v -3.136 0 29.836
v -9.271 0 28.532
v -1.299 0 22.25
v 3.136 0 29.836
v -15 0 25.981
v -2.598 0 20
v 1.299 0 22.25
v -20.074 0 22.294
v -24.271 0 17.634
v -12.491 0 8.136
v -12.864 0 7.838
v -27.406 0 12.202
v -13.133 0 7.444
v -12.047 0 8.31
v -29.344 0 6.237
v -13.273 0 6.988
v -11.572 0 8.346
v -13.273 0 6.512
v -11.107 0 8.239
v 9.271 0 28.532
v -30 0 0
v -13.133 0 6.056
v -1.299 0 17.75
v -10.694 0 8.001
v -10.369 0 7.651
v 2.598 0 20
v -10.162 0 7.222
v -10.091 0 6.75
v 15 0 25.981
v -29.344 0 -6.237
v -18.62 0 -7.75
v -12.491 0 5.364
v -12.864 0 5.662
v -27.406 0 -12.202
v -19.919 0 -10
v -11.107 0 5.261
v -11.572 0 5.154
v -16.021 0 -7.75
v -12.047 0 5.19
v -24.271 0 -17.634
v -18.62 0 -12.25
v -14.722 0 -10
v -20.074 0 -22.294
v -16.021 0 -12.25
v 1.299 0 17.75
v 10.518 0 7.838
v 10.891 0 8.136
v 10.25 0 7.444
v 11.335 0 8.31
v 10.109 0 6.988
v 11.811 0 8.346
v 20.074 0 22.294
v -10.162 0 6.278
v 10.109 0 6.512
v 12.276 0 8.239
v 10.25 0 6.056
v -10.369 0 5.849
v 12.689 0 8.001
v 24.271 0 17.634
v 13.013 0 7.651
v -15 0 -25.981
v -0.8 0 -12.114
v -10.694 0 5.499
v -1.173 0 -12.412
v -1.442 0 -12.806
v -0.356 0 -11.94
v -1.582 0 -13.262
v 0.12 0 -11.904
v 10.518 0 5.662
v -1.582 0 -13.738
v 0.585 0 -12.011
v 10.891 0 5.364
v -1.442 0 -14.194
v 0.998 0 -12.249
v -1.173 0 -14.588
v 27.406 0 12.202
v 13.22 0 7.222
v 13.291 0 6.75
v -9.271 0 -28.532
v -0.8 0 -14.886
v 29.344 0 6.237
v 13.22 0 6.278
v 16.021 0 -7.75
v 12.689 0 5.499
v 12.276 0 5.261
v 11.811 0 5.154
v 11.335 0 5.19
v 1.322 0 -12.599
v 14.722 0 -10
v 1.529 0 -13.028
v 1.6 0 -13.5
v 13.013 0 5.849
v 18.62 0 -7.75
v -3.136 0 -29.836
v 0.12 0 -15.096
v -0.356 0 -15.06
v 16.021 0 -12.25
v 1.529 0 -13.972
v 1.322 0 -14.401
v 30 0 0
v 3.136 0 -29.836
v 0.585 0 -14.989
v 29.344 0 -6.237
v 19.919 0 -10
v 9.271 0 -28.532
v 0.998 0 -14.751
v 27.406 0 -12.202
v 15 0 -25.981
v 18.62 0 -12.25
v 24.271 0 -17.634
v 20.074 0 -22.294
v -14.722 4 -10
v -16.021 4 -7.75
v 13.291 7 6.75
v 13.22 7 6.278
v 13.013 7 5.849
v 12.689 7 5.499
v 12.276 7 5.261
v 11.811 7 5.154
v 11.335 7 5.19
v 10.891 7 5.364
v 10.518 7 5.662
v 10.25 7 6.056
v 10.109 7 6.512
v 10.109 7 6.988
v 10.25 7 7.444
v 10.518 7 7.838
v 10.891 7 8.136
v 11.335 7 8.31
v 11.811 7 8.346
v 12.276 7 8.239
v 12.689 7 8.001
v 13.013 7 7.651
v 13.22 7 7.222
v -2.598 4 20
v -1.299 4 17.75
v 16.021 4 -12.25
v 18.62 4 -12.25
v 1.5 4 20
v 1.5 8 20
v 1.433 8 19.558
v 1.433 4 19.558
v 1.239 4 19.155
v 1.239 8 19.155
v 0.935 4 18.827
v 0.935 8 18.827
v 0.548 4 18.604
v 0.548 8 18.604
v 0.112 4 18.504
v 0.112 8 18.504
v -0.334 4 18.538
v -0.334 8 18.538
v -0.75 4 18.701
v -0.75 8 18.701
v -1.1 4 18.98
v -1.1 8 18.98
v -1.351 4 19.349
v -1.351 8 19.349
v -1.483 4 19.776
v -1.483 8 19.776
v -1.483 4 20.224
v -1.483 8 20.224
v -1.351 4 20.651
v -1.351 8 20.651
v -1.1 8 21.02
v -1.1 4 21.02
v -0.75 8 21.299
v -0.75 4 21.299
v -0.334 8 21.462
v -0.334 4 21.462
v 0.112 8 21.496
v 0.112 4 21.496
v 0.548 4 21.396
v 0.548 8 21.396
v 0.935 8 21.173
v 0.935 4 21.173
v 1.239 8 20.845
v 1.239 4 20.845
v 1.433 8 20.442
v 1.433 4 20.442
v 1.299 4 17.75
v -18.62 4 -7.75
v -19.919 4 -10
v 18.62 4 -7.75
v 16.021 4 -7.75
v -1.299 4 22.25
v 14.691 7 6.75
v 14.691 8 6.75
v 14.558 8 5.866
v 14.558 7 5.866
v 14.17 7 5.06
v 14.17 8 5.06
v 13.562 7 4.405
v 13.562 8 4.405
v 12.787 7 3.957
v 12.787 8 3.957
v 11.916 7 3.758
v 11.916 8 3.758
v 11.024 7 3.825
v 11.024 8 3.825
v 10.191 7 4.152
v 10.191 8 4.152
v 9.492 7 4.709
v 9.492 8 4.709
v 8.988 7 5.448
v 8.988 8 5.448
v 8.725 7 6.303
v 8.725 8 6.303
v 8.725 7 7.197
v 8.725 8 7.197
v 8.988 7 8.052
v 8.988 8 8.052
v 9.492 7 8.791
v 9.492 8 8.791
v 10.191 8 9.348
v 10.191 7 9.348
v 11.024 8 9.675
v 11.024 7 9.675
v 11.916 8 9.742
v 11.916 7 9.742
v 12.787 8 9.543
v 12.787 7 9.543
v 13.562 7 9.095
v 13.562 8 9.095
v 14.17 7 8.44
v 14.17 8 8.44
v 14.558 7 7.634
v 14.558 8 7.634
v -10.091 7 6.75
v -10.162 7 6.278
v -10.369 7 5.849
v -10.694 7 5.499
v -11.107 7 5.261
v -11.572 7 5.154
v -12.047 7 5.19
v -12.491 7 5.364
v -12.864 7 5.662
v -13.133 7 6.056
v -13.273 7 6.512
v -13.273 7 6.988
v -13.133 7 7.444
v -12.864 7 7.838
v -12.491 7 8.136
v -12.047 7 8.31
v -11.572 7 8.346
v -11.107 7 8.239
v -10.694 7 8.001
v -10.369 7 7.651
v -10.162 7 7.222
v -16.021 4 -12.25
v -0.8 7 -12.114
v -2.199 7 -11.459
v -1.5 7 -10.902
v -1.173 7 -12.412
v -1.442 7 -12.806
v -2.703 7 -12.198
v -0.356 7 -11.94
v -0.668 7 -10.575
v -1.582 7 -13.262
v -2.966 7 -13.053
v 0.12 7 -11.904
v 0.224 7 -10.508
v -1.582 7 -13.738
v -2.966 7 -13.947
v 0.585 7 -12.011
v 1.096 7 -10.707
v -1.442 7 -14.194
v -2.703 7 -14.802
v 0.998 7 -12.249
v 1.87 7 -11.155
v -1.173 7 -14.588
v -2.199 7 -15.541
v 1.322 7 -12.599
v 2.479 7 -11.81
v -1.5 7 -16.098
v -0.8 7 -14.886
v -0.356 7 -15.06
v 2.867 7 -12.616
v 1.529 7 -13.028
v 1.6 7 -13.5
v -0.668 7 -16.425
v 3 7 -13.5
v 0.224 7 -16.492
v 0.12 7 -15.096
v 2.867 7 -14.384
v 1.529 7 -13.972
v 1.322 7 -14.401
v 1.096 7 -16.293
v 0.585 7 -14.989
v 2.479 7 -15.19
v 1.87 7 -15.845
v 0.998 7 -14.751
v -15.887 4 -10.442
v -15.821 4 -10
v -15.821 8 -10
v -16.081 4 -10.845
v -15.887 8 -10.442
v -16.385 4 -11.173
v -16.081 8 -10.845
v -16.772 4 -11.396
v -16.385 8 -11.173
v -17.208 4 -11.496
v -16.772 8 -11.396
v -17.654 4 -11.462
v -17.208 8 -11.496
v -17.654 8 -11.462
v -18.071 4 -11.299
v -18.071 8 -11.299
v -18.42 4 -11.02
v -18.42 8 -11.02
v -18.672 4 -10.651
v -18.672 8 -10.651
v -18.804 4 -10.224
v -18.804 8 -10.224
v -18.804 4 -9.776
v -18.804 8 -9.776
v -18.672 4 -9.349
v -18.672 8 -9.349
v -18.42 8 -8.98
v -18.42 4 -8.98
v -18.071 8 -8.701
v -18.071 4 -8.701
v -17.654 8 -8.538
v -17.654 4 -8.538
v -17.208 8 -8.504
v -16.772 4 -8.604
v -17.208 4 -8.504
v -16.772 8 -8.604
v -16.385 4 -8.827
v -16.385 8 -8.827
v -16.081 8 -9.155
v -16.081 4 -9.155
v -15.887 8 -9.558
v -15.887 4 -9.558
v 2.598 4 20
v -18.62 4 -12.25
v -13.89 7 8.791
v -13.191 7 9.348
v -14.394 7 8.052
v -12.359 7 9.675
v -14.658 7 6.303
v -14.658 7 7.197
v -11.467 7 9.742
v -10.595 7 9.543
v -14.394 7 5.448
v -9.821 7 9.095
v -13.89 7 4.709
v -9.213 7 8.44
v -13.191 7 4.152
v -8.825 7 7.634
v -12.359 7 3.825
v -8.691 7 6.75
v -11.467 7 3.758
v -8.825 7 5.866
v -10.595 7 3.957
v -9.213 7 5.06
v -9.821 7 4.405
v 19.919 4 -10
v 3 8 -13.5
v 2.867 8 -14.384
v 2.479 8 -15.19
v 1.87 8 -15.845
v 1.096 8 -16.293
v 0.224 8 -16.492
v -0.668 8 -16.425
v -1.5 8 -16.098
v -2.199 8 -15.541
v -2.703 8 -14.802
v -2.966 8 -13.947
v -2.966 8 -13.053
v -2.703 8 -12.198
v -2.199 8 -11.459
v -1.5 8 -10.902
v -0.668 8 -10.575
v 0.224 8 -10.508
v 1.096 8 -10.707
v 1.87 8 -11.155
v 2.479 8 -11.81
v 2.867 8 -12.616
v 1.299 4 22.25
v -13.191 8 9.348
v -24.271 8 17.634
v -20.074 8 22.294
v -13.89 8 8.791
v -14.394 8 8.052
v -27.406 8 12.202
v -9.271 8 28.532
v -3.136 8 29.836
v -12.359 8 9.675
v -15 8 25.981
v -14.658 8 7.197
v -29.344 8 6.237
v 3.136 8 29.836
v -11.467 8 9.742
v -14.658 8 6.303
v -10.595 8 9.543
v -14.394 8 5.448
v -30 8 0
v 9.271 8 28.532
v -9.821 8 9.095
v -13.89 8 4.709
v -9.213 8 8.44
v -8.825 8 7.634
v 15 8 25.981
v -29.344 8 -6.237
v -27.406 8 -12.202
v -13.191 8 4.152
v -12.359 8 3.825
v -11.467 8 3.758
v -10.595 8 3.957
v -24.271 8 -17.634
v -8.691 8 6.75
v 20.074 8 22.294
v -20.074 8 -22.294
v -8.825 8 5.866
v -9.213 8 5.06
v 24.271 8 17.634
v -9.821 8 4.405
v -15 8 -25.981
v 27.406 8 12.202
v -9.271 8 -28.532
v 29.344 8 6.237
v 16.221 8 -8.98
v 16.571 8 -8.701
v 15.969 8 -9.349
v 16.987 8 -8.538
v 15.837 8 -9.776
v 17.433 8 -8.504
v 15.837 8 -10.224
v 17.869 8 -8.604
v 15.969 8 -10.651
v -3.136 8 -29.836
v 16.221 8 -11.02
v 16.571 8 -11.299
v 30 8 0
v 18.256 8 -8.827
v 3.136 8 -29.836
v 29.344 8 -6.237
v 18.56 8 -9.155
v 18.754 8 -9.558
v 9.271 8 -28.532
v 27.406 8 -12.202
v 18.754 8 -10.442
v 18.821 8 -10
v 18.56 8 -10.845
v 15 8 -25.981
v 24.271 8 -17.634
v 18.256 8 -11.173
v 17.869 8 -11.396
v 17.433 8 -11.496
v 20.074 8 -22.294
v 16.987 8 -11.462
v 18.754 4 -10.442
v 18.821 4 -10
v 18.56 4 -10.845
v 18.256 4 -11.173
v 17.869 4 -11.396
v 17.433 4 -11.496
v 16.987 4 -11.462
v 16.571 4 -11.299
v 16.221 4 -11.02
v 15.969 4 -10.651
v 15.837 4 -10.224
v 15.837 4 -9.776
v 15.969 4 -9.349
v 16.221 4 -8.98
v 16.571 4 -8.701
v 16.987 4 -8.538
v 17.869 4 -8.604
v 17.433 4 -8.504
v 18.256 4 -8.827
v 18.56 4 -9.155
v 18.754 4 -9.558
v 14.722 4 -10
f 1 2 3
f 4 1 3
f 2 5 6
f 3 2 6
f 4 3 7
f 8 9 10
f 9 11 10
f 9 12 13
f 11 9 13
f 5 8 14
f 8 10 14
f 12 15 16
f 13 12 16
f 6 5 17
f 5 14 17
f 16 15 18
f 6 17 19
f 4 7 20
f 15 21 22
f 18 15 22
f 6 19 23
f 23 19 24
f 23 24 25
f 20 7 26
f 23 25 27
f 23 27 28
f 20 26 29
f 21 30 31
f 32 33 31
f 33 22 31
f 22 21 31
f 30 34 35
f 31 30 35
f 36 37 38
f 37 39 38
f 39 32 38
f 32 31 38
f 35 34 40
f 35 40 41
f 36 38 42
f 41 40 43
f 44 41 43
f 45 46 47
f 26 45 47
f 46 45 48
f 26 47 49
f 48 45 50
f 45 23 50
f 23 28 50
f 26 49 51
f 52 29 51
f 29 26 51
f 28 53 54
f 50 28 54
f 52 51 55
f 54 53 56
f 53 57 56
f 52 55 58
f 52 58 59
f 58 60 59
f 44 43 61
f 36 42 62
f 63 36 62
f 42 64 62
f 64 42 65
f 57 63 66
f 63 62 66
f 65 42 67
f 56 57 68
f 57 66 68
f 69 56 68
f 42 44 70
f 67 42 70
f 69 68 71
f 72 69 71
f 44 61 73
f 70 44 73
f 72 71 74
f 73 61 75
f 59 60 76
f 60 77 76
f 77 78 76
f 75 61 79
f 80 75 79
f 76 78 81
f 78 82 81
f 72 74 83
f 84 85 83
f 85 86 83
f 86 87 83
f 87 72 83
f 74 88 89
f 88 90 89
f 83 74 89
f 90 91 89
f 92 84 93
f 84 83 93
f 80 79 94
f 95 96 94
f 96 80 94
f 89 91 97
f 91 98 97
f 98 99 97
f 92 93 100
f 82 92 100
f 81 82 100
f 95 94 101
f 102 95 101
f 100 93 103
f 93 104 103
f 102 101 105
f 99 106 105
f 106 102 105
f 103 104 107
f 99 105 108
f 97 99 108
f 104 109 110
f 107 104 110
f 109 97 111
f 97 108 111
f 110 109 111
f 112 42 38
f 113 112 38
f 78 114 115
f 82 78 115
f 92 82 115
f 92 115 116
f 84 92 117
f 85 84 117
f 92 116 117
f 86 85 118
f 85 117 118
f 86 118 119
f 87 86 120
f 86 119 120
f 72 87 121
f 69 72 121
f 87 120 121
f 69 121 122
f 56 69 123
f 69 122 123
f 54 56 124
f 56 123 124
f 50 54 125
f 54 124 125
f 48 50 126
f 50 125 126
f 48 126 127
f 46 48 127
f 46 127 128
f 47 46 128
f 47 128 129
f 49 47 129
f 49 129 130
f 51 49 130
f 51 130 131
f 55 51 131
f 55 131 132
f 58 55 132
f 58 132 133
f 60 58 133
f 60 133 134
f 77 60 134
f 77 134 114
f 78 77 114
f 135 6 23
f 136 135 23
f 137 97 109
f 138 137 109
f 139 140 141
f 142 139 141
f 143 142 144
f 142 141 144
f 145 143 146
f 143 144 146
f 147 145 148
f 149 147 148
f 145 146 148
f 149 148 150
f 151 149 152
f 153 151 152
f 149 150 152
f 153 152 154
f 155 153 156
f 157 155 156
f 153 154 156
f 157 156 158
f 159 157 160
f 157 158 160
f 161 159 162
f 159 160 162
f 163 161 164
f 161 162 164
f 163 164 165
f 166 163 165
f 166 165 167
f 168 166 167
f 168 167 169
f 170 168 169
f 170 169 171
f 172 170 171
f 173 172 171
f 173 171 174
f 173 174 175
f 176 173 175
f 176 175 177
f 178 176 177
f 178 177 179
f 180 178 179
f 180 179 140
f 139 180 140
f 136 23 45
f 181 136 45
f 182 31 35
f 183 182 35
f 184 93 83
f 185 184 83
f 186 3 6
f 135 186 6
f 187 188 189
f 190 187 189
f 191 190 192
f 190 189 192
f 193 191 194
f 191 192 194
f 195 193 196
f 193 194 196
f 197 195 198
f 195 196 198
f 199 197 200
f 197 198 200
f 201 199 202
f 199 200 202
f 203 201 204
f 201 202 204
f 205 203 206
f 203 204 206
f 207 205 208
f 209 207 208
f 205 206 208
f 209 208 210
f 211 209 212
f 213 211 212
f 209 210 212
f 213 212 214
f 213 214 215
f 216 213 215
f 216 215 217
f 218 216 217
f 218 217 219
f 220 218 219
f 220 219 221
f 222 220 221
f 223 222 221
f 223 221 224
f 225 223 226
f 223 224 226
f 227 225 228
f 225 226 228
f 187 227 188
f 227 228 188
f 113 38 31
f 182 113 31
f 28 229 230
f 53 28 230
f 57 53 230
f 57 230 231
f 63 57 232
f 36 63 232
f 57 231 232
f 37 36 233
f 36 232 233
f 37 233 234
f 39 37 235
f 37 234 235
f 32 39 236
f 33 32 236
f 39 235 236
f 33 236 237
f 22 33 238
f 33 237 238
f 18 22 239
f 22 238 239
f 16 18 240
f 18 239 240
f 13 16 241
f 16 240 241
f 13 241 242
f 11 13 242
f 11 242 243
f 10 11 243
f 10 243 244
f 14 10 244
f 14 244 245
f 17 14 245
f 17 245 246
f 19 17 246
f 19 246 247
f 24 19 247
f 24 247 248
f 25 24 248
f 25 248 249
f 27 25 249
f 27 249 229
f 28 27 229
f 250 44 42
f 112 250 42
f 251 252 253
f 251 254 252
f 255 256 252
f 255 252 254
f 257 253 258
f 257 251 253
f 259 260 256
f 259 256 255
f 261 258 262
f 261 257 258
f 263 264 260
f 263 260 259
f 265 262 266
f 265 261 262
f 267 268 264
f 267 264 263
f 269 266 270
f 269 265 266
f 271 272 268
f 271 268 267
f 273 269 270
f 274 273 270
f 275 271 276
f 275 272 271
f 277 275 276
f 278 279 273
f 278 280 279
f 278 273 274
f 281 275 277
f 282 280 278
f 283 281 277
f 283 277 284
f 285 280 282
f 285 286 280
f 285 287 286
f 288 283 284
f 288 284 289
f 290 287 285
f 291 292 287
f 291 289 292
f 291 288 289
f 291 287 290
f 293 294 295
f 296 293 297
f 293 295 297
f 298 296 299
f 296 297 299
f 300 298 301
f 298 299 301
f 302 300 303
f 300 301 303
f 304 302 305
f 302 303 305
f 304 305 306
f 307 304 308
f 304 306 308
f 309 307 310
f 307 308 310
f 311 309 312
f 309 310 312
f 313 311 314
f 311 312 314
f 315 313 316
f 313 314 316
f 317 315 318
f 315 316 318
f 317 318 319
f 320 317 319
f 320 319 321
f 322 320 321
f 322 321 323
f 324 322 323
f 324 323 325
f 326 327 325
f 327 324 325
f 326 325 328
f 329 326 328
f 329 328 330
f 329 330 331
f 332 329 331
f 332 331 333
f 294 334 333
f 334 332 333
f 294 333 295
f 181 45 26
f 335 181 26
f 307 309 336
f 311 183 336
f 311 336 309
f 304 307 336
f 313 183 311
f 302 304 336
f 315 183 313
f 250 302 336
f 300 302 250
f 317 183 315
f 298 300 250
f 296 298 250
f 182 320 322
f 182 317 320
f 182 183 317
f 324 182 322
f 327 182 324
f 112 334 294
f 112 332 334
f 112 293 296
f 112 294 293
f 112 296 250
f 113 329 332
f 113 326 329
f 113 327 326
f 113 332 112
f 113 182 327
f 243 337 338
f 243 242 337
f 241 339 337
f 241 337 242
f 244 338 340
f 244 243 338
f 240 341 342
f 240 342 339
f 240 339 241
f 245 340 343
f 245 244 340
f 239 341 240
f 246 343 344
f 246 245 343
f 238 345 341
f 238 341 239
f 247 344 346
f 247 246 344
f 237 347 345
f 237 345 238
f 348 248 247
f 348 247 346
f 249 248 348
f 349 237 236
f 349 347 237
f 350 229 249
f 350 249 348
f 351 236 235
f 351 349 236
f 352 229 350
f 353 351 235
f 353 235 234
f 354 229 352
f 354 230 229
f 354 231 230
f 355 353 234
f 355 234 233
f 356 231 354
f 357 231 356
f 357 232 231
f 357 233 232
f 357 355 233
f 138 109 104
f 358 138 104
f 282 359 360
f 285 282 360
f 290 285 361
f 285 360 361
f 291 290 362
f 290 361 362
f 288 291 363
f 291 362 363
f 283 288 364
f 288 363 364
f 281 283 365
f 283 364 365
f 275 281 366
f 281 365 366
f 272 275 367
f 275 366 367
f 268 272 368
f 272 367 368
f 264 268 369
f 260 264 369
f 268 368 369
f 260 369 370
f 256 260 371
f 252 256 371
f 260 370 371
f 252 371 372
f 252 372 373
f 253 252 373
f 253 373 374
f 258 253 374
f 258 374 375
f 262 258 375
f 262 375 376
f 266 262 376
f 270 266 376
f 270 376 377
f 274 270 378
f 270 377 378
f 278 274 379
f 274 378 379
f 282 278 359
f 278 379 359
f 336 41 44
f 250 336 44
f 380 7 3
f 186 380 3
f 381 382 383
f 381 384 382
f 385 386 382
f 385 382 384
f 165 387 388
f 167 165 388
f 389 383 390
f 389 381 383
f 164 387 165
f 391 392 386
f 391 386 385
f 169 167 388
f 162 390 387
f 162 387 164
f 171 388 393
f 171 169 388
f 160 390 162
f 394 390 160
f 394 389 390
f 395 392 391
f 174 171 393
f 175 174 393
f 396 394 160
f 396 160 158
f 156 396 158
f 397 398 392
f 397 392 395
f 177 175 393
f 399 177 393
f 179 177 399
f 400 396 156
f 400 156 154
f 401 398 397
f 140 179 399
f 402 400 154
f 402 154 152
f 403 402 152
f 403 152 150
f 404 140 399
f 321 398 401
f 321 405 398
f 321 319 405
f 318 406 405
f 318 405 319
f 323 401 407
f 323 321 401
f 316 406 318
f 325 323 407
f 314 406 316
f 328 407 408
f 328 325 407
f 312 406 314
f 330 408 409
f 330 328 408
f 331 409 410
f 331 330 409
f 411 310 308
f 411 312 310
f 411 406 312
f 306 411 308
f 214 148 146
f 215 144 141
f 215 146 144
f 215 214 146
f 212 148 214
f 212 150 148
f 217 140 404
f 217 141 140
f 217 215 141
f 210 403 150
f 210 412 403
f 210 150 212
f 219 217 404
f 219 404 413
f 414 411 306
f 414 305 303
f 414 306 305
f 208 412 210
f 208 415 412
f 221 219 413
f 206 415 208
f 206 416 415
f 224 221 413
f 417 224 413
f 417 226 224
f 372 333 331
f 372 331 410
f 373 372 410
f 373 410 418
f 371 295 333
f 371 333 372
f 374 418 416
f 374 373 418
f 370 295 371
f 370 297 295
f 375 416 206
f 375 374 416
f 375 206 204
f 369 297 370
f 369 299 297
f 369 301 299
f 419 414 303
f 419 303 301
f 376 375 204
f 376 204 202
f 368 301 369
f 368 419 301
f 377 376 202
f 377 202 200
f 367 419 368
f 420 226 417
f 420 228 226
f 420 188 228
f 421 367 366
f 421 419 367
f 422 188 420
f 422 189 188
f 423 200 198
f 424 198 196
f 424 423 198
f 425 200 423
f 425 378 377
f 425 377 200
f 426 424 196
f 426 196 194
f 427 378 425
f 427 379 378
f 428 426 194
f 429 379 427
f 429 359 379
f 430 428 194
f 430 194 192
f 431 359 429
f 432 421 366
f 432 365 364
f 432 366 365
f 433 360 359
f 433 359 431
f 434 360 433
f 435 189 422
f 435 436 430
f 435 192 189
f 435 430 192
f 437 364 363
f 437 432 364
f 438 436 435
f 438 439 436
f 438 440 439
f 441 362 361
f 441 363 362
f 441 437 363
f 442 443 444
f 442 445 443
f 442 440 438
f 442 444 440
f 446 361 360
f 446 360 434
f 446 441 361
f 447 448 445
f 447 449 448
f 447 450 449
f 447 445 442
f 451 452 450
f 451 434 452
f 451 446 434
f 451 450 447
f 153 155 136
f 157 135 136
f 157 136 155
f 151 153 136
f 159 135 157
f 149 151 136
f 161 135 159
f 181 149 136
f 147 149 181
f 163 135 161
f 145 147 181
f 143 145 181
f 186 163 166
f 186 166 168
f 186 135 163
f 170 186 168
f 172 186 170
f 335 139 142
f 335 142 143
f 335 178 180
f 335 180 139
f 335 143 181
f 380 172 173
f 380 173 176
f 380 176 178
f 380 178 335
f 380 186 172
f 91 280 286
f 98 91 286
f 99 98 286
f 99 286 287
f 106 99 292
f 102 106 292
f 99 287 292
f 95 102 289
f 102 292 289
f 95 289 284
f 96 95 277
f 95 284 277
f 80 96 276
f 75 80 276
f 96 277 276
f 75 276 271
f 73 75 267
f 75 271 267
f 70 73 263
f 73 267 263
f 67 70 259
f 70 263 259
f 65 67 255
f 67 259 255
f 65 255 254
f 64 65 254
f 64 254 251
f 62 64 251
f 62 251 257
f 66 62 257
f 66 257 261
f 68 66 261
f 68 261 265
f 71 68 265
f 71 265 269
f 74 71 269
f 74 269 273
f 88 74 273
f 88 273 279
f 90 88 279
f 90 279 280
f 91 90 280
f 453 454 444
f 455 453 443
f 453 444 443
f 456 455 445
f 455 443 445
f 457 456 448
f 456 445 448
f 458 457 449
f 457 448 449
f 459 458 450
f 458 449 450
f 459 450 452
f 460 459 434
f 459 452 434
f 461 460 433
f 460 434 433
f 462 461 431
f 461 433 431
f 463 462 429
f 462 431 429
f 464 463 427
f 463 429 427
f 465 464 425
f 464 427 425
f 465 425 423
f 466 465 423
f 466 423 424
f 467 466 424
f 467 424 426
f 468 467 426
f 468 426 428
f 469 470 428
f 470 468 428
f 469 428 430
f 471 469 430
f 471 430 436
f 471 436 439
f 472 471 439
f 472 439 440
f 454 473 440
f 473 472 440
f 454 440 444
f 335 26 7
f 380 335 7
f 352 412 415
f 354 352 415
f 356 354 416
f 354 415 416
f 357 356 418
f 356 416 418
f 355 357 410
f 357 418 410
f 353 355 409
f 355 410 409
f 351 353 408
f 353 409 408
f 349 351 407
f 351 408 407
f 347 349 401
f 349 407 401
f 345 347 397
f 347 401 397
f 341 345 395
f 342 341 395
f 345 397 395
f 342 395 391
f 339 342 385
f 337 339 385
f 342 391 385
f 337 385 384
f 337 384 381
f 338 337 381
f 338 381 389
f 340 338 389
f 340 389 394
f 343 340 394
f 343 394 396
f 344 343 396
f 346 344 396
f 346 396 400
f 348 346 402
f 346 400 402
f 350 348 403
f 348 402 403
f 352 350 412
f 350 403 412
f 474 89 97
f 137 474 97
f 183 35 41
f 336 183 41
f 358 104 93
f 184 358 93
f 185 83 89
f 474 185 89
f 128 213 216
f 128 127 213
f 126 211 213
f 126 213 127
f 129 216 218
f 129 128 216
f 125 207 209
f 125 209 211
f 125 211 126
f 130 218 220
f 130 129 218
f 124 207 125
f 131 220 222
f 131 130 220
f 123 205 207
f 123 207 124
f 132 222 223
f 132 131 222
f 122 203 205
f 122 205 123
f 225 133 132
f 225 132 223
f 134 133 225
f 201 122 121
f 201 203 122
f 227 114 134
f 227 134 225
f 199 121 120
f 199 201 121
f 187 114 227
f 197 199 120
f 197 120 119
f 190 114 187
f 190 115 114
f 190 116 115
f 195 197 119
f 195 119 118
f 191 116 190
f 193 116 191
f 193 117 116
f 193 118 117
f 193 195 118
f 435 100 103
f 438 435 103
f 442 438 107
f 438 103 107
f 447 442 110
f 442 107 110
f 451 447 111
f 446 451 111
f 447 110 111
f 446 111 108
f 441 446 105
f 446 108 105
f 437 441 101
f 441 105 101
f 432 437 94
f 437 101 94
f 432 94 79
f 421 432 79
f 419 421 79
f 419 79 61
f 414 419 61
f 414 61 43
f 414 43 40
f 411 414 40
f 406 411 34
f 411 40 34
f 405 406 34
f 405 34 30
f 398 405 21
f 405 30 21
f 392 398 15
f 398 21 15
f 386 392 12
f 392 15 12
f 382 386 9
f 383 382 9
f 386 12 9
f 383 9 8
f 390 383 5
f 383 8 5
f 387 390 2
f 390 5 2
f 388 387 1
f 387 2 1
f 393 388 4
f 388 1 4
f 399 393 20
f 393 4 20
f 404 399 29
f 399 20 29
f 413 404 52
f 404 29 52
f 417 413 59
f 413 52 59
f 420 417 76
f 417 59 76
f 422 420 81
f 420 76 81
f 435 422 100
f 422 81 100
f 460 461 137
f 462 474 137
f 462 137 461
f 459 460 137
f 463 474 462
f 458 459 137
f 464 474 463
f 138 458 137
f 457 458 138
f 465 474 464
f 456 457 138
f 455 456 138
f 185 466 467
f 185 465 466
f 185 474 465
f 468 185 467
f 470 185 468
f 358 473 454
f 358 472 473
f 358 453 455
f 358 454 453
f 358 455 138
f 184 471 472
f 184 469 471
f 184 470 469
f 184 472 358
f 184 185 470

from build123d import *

# Parameters (mm, degrees)
SKETCH_1_R          = 30
EXTRUDE_1_DEPTH     = 8
SKETCH_2_R          = 1.6
CUT_EXTRUDE_1_DEPTH = 15
SKETCH_3_R          = 1.5
CUT_EXTRUDE_2_DEPTH = 8
SKETCH_4_R          = 3
CUT_EXTRUDE_3_DEPTH = 1
SKETCH_5_R          = 1.5
CUT_EXTRUDE_4_DEPTH = 4


with BuildPart() as part:
    # 草图1 → 凸台-拉伸1 (new body)
    with BuildSketch(Plane(origin=(0, 0, 0), x_dir=(1, 0, 0), z_dir=(0, 1, 0))):
        Circle(SKETCH_1_R)
    extrude(amount=EXTRUDE_1_DEPTH)

    # 草图2 → 切除-拉伸1 (cut)
    with BuildSketch(Plane(origin=(0, 8, 0), x_dir=(1, 0, 0), z_dir=(0, 1, 0))):
        with Locations((0, 13.5)):
            Circle(SKETCH_2_R)
        with Locations((11.691342951, -6.75)):
            Circle(SKETCH_2_R)
        with Locations((-11.691342951, -6.75)):
            Circle(SKETCH_2_R)
    extrude(amount=-CUT_EXTRUDE_1_DEPTH, mode=Mode.SUBTRACT)

    # 草图3 → 切除-拉伸2 (cut)
    with BuildSketch(Plane(origin=(0, 8, 0), x_dir=(1, 0, 0), z_dir=(0, 1, 0))):
        with Locations((17.320508076, 10)):
            Circle(SKETCH_3_R)
        with Locations((0, -20)):
            Circle(SKETCH_3_R)
        with Locations((-17.320508076, 10)):
            Circle(SKETCH_3_R)
    extrude(amount=-CUT_EXTRUDE_2_DEPTH, mode=Mode.SUBTRACT)

    # 草图4 → 切除-拉伸3 (cut)
    with BuildSketch(Plane(origin=(0, 8, 0), x_dir=(1, 0, 0), z_dir=(0, 1, 0))):
        with Locations((0, 13.5)):
            Circle(SKETCH_4_R)
        with Locations((11.691342951, -6.75)):
            Circle(SKETCH_4_R)
        with Locations((-11.691342951, -6.75)):
            Circle(SKETCH_4_R)
    extrude(amount=-CUT_EXTRUDE_3_DEPTH, mode=Mode.SUBTRACT)

    # 草图5 → 切除-拉伸4 (cut)
    with BuildSketch(Plane.XZ):
        Polygon((-14.722431864, -10), (-16.02146997, -7.75), (-18.619546181, -7.75), (-19.918584287, -10), (-18.619546181, -12.25), (-16.02146997, -12.25), align=None)
        with Locations((-17.320508076, -10)):
            Circle(SKETCH_5_R, mode=Mode.SUBTRACT)
        Polygon((16.02146997, -7.75), (14.722431864, -10), (16.02146997, -12.25), (18.619546181, -12.25), (19.918584287, -10), (18.619546181, -7.75), align=None)
        with Locations((17.320508076, -10)):
            Circle(SKETCH_5_R, mode=Mode.SUBTRACT)
        Polygon((1.299038106, 22.25), (-1.299038106, 22.25), (-2.598076211, 20), (-1.299038106, 17.75), (1.299038106, 17.75), (2.598076211, 20), align=None)
    extrude(amount=-CUT_EXTRUDE_4_DEPTH, mode=Mode.SUBTRACT)


solid = part.part
